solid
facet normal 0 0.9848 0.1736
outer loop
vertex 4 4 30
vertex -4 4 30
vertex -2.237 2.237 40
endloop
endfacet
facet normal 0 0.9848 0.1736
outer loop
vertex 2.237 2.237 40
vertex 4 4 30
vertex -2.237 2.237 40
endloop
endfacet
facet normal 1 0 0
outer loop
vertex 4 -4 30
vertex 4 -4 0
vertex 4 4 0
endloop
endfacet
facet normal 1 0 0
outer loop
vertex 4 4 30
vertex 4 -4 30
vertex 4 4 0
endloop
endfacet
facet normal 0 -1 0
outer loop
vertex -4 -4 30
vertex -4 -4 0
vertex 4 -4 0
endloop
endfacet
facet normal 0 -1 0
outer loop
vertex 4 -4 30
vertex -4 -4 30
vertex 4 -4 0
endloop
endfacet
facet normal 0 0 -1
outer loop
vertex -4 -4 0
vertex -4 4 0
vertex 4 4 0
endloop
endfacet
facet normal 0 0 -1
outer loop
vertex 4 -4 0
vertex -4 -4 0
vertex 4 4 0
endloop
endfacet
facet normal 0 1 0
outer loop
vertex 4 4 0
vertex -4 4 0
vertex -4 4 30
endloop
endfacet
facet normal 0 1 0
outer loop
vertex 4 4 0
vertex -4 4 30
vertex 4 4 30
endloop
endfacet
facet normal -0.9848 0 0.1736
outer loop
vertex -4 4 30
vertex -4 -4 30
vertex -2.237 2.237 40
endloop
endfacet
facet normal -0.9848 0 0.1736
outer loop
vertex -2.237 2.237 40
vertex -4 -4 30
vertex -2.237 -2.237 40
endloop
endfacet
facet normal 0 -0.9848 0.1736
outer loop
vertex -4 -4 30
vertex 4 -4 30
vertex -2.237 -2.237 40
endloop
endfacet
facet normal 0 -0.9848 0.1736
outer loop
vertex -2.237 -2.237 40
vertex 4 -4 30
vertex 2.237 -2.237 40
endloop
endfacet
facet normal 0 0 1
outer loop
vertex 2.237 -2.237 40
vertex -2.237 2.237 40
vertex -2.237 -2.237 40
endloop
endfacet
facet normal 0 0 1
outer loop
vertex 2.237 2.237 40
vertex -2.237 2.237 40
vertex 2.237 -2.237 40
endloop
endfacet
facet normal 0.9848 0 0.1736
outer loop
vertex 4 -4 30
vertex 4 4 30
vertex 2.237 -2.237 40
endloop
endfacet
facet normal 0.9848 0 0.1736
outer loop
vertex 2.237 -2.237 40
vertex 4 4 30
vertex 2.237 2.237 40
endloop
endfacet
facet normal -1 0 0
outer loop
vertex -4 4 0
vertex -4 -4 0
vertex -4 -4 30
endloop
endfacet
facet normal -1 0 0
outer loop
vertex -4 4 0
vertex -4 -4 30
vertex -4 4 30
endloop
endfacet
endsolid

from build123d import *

# Parameters (mm, degrees)
SKETCH1_W           = 8
SKETCH1_H           = 8
BOSS_EXTRUDE1_DEPTH = 30
SKETCH2_W           = 8
SKETCH2_H           = 8
BOSS_EXTRUDE2_DEPTH = 10
BOSS_EXTRUDE2_TAPER = 10


with BuildPart() as part:
    # Sketch1 → Boss-Extrude1 (new body)
    with BuildSketch(Plane.XY):
        Rectangle(SKETCH1_W, SKETCH1_H)
    extrude(amount=BOSS_EXTRUDE1_DEPTH)

    # Sketch2 → Boss-Extrude2 (add)
    with BuildSketch(Plane.XY.offset(30)):
        Rectangle(SKETCH2_W, SKETCH2_H)
    extrude(amount=BOSS_EXTRUDE2_DEPTH, taper=BOSS_EXTRUDE2_TAPER)


solid = part.part
